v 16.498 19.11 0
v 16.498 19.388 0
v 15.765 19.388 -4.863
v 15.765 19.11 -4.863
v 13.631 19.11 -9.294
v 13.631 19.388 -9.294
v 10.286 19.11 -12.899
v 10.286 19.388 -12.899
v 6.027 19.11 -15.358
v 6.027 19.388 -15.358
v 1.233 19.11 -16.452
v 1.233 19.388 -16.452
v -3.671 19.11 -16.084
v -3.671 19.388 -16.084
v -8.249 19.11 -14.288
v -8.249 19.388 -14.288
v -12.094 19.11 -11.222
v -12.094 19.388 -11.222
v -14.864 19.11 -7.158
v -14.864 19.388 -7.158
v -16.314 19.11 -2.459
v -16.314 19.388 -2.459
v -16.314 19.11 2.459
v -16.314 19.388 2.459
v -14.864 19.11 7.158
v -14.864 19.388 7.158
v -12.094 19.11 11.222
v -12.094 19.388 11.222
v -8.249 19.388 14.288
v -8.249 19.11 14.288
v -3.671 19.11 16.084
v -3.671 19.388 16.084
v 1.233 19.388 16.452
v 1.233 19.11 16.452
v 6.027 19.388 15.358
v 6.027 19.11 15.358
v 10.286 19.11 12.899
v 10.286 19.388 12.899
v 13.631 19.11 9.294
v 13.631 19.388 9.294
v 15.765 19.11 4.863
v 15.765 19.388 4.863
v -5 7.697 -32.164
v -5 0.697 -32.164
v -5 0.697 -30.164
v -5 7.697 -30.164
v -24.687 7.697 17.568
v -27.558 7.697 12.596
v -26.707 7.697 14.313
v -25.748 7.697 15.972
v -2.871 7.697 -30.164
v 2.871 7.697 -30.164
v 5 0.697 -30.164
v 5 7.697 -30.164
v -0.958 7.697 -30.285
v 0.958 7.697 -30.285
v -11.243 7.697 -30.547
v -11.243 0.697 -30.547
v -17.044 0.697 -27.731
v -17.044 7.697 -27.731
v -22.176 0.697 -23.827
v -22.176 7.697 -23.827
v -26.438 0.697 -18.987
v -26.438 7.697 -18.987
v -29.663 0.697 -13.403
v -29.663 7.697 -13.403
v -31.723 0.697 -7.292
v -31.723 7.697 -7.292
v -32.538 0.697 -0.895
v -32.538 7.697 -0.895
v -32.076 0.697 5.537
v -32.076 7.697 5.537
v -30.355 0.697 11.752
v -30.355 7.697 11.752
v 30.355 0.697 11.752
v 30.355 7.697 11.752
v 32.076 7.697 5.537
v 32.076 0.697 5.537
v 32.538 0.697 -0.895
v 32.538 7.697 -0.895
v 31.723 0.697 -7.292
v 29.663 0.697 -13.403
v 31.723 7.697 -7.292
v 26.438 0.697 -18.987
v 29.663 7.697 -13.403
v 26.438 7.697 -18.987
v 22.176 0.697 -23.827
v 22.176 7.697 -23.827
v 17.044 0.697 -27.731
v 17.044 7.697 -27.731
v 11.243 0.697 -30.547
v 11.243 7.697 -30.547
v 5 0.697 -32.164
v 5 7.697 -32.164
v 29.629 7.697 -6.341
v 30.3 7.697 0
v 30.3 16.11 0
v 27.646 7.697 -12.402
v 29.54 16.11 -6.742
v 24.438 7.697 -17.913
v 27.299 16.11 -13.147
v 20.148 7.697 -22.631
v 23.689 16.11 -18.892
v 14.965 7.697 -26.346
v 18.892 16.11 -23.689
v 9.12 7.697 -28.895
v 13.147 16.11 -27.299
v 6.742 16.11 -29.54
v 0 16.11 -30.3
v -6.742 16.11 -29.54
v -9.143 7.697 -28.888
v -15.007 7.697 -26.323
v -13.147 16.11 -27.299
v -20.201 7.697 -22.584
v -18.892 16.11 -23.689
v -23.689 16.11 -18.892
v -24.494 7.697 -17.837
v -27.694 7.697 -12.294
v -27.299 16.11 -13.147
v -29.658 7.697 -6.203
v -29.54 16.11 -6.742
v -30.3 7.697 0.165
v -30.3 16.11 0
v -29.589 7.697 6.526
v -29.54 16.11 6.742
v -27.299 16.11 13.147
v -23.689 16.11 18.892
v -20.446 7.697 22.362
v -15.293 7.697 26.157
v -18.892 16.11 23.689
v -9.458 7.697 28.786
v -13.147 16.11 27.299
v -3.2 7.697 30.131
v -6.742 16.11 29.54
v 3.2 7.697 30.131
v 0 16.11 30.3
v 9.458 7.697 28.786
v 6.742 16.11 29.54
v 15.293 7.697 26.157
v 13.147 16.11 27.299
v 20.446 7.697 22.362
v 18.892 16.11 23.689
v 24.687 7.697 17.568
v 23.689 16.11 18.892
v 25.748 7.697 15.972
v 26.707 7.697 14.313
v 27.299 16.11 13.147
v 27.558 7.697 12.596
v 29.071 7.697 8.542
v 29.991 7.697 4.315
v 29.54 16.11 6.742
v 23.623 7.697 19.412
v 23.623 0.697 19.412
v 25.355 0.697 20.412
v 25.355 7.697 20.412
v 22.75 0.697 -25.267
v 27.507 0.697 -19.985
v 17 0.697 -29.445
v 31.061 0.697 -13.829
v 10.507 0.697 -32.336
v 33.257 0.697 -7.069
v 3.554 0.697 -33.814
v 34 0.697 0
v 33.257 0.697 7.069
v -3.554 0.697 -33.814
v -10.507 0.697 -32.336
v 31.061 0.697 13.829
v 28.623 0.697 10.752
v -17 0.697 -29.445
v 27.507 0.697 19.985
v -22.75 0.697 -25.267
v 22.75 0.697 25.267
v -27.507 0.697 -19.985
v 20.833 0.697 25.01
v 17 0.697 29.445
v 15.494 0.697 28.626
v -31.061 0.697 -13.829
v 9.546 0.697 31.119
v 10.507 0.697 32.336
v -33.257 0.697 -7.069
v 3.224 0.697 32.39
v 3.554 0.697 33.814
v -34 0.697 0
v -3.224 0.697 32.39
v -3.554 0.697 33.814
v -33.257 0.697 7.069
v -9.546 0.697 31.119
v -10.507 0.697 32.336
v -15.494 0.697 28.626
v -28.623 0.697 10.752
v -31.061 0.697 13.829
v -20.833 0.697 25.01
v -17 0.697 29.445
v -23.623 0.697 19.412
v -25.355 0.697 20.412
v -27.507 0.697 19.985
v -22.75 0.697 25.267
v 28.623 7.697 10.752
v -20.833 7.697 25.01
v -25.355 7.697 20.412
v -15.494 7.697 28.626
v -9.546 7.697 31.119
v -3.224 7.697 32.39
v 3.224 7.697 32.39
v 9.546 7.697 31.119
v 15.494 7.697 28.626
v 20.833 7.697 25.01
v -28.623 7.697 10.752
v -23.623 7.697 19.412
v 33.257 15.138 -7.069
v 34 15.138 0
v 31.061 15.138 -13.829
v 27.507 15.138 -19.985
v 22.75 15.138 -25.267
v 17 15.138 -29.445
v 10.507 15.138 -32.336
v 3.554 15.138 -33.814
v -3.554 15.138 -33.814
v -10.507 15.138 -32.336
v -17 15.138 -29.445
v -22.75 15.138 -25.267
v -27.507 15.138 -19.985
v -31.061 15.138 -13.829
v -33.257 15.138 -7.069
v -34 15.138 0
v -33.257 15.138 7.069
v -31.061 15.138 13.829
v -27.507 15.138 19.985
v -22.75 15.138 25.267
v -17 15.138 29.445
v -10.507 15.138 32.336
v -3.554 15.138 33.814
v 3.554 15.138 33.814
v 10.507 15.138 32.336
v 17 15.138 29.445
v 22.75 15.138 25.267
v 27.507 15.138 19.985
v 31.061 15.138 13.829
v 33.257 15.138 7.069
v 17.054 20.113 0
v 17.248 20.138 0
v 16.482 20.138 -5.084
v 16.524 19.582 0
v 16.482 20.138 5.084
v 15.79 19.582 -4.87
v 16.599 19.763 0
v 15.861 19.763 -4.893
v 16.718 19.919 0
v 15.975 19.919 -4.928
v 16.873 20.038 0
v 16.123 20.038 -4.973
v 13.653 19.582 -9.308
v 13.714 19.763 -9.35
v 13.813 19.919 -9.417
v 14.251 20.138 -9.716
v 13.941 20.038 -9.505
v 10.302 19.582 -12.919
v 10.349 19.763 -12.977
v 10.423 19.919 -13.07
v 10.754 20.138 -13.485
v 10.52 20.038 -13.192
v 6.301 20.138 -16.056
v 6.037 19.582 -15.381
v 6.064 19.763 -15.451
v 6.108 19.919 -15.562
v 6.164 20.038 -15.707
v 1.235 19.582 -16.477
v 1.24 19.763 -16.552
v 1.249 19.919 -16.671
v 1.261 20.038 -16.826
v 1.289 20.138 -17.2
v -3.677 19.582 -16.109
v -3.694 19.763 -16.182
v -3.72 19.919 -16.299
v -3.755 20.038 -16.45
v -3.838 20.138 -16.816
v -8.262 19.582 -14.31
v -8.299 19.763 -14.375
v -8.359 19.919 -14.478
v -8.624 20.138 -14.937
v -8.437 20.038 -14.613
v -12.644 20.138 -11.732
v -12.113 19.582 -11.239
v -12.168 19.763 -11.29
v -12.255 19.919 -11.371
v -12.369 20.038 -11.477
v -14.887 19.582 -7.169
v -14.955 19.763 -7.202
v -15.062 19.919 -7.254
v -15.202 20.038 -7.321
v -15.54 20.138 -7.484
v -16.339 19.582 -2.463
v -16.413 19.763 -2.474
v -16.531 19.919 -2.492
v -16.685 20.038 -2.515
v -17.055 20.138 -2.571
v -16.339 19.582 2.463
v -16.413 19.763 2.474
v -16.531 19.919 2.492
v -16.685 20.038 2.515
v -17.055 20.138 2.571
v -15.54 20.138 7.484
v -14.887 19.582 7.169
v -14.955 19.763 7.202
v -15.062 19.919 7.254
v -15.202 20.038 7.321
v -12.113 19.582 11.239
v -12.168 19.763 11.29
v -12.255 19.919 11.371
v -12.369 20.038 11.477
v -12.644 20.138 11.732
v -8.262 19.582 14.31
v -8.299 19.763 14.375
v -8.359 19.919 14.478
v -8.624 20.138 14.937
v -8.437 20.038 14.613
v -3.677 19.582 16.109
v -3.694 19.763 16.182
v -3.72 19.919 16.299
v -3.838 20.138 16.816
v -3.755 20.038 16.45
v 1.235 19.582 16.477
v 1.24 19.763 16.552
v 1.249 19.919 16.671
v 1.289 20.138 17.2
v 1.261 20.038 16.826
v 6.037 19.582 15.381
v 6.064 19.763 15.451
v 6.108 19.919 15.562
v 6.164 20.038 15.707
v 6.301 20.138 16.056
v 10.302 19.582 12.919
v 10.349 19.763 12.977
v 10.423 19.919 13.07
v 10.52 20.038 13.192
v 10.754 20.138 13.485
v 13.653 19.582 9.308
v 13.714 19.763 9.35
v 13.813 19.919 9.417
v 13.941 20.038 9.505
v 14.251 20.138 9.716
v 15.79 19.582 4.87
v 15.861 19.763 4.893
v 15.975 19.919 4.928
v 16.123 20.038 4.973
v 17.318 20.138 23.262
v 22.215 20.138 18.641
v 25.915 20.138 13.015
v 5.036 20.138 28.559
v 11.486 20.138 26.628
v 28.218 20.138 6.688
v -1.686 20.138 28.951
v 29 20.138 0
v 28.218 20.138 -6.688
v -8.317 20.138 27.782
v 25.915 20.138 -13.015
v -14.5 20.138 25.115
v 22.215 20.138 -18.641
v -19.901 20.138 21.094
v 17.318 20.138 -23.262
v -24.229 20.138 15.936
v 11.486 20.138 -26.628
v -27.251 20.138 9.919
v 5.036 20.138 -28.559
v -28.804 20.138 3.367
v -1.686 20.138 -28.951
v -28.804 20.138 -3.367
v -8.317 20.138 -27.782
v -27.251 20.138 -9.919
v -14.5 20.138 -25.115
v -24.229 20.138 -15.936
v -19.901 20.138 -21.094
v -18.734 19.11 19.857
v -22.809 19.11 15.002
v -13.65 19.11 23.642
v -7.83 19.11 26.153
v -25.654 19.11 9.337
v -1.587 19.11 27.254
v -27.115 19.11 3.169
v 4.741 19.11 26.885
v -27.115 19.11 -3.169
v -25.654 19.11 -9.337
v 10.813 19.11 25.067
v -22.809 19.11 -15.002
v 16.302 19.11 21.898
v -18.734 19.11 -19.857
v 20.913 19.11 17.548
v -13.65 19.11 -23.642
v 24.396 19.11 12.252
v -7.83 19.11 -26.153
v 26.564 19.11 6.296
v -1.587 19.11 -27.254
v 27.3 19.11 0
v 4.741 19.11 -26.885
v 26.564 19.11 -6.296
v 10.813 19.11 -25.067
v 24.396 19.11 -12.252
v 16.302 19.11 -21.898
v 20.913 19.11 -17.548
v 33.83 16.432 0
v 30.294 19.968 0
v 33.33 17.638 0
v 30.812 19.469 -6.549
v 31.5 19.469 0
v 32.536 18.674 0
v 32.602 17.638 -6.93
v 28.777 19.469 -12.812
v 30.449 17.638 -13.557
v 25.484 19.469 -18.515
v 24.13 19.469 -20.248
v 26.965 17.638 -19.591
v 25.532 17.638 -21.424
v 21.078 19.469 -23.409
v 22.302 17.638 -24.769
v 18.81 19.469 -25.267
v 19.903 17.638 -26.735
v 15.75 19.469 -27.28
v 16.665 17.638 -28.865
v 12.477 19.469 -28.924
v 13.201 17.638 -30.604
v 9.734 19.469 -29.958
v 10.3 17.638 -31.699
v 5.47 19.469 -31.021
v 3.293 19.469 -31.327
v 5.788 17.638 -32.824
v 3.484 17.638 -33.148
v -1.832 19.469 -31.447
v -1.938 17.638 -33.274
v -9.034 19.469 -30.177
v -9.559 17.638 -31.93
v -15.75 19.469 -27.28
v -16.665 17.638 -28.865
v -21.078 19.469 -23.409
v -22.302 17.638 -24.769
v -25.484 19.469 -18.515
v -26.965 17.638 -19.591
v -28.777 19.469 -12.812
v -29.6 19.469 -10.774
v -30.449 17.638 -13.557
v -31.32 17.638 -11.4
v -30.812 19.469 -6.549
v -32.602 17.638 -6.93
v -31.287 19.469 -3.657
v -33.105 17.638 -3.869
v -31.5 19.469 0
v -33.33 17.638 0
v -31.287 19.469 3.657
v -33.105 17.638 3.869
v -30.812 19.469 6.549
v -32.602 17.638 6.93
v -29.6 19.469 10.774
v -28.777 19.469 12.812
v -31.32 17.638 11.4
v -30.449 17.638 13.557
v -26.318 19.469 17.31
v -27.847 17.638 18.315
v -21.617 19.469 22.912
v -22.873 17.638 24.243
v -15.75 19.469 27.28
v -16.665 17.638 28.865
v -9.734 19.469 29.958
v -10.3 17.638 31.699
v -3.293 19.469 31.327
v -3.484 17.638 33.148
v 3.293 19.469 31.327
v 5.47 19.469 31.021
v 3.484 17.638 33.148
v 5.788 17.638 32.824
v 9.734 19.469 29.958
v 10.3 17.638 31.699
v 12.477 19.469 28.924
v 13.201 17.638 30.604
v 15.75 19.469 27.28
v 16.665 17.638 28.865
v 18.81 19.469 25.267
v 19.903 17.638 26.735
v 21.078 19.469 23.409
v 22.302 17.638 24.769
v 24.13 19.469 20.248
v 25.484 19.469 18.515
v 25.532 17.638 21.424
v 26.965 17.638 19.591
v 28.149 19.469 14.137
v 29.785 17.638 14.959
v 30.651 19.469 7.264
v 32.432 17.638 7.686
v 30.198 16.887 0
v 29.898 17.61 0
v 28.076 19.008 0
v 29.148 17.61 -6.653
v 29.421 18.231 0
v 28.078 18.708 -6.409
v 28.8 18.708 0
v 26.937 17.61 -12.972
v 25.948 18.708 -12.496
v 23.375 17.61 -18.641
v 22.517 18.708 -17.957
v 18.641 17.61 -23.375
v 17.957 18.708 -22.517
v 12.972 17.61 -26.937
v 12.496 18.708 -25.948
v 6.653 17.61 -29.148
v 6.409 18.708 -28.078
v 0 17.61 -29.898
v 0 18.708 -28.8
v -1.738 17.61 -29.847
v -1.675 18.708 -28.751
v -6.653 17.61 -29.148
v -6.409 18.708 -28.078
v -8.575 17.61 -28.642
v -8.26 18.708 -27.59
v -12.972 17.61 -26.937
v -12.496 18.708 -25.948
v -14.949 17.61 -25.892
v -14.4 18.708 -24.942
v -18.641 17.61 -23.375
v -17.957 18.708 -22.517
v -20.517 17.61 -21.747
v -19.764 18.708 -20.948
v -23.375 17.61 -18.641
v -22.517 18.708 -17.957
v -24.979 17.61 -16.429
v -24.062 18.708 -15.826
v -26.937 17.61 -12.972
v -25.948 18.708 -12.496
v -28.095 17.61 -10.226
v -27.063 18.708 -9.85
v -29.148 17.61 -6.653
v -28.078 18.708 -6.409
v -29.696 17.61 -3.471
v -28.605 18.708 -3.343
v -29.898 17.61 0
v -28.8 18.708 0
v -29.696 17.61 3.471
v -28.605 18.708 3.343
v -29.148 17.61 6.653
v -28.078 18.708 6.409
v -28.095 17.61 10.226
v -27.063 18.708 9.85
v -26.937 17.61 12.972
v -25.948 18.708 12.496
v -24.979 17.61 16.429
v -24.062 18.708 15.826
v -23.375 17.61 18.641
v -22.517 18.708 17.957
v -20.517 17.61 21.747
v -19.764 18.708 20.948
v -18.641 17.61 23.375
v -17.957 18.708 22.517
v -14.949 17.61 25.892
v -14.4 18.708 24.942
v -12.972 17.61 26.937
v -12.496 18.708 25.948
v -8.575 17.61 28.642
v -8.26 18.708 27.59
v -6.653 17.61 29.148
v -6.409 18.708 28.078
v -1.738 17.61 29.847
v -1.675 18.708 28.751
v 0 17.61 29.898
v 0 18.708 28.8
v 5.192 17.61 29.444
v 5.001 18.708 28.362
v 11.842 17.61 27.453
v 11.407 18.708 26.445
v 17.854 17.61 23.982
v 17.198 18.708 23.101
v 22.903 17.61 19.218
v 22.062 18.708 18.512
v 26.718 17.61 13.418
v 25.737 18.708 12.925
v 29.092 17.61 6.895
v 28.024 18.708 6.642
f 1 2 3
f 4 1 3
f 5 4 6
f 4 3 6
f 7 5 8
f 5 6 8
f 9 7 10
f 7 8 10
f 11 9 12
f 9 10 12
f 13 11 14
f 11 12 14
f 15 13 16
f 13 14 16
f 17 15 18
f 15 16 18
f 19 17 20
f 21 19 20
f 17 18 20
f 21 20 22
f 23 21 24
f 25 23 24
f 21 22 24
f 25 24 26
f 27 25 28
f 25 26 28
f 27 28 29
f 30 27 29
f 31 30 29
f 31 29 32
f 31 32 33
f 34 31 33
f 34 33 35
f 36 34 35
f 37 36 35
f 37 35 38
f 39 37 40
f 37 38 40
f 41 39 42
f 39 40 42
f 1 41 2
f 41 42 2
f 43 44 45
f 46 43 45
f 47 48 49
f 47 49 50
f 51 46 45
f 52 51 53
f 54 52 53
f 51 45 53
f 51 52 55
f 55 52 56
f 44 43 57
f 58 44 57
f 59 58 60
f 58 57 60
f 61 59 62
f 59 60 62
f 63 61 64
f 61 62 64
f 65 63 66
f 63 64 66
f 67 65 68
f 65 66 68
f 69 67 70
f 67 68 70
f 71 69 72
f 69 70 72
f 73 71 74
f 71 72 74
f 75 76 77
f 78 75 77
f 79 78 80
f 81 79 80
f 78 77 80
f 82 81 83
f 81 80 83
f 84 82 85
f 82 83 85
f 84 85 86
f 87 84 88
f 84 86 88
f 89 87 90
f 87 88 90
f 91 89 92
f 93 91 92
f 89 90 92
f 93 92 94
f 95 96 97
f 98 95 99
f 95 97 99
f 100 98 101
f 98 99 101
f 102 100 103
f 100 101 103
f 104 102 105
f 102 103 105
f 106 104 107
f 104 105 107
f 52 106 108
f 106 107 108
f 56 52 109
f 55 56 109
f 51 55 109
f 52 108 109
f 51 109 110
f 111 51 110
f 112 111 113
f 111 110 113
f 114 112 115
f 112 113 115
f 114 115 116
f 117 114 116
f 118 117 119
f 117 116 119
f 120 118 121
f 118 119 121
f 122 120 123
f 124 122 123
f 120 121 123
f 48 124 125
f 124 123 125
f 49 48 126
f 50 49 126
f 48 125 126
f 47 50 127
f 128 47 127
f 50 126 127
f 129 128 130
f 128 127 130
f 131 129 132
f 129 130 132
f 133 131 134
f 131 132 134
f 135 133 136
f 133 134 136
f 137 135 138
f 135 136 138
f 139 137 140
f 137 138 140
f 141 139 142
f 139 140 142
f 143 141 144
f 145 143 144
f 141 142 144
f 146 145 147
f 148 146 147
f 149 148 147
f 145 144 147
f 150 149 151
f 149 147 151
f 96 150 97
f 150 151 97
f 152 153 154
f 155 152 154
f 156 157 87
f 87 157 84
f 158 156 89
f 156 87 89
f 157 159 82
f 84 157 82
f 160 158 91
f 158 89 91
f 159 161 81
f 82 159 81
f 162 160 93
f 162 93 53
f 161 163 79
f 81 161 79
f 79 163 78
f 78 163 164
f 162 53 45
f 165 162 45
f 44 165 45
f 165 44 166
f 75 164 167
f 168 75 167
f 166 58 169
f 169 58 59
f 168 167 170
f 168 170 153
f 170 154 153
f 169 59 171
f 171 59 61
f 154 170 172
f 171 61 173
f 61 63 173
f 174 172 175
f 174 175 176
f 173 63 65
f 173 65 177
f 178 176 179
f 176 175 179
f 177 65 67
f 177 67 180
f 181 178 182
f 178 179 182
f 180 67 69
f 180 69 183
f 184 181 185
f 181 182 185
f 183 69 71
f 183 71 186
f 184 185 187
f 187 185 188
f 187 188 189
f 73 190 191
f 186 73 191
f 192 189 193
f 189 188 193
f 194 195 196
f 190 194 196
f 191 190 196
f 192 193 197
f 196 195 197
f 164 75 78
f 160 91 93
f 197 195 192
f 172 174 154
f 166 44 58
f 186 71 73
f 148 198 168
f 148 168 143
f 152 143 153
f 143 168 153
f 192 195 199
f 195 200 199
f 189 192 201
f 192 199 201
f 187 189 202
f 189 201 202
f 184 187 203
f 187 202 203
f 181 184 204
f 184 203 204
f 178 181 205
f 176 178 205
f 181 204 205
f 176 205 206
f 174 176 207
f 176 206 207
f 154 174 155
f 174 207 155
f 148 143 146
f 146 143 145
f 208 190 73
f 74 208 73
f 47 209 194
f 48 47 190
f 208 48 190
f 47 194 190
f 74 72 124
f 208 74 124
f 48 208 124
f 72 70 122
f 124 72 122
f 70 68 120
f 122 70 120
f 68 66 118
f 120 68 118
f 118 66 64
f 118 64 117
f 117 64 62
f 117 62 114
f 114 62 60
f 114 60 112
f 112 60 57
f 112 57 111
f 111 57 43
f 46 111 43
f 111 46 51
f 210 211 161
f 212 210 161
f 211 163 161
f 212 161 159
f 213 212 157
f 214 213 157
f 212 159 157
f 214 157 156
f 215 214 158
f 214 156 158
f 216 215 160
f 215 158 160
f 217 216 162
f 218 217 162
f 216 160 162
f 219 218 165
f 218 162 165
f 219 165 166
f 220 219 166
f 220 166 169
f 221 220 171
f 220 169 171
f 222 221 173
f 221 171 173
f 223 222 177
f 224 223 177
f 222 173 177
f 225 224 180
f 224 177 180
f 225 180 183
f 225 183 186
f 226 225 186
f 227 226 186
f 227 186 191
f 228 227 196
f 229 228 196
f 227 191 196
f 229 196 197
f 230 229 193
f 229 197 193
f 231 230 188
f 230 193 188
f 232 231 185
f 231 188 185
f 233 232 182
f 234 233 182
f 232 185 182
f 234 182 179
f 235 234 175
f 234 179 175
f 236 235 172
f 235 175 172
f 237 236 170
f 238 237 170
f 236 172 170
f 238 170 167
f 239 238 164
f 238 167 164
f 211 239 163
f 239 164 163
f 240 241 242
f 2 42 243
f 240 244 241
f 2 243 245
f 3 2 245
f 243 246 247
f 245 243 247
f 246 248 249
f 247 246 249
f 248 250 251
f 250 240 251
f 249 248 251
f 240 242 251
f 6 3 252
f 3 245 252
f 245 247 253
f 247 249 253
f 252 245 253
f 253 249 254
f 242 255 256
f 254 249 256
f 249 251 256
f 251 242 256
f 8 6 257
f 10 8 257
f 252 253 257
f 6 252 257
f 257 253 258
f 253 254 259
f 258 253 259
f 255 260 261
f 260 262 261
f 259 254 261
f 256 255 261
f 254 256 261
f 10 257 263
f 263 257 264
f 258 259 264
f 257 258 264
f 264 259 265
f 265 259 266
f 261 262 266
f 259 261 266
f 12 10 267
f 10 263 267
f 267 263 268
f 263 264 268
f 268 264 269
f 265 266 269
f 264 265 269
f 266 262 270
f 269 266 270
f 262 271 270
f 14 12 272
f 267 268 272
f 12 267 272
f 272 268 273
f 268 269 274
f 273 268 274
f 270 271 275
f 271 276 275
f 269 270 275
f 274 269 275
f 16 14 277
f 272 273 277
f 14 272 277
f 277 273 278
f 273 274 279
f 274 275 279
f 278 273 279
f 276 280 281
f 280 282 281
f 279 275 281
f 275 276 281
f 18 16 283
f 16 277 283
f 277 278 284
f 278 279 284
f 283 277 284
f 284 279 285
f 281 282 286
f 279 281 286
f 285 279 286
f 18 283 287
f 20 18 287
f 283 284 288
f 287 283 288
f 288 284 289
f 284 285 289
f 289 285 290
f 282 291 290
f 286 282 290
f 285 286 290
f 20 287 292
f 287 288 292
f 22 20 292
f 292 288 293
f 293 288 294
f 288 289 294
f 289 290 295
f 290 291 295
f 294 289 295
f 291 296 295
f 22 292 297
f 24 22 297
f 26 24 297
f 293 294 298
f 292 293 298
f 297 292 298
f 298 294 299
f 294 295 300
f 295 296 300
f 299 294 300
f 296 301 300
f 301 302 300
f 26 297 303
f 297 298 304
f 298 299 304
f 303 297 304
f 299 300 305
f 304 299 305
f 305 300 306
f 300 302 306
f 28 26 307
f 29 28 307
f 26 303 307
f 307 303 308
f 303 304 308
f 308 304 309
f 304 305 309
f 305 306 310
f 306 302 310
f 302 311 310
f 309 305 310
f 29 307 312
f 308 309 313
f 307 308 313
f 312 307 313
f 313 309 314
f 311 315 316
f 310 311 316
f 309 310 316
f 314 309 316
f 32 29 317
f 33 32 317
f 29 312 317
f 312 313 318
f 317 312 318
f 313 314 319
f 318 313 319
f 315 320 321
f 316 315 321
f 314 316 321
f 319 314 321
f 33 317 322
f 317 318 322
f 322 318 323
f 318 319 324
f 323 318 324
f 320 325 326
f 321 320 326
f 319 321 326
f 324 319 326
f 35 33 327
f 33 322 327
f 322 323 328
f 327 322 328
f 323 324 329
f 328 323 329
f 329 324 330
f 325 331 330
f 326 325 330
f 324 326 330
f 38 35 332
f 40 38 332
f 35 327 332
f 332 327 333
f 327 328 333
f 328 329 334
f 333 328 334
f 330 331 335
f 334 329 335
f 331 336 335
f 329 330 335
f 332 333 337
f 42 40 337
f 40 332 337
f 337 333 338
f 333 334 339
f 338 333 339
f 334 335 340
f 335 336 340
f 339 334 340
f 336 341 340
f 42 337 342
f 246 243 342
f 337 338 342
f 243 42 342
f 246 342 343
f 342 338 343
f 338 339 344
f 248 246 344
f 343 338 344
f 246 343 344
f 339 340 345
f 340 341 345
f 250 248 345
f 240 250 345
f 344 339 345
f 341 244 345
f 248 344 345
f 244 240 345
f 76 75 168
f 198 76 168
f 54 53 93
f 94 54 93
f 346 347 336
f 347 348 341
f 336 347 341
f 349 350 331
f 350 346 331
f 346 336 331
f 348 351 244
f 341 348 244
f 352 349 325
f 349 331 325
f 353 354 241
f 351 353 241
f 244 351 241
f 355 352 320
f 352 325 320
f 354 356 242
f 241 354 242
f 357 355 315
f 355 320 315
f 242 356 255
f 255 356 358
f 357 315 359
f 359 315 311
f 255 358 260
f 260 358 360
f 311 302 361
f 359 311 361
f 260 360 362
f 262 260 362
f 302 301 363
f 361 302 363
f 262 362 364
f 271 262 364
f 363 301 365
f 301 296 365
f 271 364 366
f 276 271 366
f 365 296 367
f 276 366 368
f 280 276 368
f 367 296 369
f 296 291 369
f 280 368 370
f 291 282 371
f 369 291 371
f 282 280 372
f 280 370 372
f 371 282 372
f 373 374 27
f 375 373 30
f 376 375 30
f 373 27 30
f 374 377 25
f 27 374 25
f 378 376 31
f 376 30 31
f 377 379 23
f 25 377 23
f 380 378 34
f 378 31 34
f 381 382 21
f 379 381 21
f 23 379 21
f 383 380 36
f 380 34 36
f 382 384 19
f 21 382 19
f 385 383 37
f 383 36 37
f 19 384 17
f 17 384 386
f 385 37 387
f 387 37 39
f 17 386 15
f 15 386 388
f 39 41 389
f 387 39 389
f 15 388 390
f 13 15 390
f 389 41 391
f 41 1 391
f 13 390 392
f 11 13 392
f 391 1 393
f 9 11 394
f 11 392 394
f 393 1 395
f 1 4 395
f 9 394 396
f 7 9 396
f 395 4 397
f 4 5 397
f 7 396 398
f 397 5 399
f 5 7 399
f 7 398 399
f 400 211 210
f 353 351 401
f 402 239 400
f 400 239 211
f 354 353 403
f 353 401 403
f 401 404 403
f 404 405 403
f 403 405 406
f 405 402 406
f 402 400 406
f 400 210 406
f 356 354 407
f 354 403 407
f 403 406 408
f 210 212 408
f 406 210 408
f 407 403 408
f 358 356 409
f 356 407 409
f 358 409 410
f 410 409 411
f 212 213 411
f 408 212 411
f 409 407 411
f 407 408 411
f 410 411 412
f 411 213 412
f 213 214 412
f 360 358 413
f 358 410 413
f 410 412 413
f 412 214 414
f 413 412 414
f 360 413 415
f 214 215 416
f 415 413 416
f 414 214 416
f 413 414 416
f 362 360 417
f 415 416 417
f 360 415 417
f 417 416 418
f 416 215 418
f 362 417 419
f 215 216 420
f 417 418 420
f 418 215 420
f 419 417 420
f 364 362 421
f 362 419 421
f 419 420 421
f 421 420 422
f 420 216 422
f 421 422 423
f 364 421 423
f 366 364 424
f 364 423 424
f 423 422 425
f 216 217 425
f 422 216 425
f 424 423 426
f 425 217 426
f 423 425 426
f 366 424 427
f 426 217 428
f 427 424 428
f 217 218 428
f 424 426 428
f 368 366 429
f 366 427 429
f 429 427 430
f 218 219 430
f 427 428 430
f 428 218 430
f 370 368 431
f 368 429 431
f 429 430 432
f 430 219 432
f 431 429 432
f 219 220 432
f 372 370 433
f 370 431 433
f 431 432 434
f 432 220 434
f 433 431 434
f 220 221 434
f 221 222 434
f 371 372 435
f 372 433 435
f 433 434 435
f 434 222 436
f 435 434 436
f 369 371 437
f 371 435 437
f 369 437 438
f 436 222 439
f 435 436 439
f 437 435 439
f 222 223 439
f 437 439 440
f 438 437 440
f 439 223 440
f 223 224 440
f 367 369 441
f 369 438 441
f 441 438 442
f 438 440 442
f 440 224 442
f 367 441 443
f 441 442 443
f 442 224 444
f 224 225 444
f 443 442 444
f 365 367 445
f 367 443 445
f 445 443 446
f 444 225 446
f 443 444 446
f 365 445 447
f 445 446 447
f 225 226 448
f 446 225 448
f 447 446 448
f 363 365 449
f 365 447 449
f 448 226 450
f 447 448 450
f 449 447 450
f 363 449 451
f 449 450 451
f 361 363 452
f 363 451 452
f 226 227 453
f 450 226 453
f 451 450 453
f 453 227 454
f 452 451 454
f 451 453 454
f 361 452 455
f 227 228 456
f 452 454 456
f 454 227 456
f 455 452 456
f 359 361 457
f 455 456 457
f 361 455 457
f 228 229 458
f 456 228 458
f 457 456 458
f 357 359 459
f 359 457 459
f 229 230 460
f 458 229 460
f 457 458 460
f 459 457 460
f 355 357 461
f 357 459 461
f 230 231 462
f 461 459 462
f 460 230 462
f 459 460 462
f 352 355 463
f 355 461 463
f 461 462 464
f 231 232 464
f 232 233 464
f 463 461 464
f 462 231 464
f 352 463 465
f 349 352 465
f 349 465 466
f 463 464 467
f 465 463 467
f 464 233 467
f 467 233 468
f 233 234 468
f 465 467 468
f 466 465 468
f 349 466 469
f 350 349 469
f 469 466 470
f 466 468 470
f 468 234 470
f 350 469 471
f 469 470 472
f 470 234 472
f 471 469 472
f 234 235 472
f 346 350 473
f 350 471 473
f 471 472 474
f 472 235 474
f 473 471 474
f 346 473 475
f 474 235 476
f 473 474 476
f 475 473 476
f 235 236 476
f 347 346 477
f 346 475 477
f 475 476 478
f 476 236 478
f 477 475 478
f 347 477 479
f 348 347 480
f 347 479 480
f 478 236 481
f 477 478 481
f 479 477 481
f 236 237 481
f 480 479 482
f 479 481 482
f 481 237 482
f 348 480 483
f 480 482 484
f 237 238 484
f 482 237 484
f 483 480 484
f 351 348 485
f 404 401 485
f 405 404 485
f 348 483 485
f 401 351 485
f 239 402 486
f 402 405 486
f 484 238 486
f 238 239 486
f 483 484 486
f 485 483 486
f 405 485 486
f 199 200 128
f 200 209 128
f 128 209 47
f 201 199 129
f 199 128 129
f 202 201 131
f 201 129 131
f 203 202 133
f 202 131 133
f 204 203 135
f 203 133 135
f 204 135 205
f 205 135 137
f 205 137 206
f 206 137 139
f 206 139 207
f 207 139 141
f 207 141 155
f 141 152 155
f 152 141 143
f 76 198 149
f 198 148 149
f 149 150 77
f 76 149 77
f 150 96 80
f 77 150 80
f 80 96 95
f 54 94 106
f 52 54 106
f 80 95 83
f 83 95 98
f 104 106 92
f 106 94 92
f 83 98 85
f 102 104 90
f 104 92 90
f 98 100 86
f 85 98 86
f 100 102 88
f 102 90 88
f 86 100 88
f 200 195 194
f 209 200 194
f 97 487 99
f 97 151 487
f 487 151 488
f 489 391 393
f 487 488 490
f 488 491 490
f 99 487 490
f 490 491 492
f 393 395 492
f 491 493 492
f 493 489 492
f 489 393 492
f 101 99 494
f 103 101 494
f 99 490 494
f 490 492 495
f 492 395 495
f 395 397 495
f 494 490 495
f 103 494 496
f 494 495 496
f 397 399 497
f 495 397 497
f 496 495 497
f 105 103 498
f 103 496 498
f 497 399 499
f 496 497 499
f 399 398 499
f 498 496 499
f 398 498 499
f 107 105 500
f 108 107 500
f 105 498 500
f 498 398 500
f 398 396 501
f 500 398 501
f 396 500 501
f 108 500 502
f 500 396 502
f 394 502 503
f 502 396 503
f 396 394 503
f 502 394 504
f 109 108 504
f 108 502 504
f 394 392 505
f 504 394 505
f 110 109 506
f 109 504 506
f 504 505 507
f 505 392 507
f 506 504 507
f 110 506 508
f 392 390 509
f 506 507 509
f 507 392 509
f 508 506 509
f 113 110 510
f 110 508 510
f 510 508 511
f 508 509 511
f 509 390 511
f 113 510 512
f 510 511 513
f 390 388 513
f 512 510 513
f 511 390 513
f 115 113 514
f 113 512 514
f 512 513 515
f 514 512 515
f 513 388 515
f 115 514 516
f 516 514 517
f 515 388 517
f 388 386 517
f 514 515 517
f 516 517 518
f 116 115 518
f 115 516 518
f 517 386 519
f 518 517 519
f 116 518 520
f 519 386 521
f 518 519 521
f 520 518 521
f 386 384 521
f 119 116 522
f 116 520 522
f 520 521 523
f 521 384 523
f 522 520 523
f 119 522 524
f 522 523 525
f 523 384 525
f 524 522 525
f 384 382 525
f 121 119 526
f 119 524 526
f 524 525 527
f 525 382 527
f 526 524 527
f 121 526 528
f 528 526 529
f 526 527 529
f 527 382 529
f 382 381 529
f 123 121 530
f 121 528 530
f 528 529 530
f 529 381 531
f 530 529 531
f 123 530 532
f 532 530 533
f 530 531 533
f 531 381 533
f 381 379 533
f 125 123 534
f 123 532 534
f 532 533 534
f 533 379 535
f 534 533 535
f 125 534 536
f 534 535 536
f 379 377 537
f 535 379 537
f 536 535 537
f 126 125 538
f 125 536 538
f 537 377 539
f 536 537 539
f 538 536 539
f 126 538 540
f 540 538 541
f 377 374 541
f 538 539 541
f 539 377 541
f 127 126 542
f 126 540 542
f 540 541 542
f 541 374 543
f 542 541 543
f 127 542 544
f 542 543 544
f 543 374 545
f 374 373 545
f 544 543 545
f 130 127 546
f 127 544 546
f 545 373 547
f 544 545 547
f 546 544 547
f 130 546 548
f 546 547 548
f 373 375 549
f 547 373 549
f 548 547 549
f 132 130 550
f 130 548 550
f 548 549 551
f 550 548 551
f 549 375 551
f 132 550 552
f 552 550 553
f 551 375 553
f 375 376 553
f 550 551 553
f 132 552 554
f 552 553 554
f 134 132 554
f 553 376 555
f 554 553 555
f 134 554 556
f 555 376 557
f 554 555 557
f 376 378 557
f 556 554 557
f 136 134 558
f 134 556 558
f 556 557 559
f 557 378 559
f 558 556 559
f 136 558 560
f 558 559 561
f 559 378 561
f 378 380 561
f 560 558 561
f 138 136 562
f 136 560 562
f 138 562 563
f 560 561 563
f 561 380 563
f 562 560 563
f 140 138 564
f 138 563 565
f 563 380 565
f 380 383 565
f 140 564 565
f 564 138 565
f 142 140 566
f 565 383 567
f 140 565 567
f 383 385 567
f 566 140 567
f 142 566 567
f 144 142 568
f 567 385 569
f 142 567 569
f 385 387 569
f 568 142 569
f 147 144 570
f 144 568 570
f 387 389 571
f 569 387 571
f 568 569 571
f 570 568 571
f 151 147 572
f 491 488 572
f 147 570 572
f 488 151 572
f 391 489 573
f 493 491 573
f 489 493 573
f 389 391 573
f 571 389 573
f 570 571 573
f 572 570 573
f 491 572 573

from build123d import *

# Parameters (mm, degrees)
FILLET2_R           = 0.75
BOSS_EXTRUDE4_DEPTH = 7


with BuildPart() as part:
    # Sketch5 → Revolve1 (revolve)
    with BuildSketch(Plane.XY):
        with BuildLine():
            Line((30.3, 7.697016625), (30.3, 16.110174346))
            ThreePointArc((30.3, 16.110174346), (29.421320344, 18.23149469), (27.3, 19.110174346))
            Line((27.3, 19.110174346), (22.498120145, 19.110174346))
            Line((22.498120145, 19.110174346), (16.498120145, 19.110174346))
            Line((16.498120145, 19.110174346), (16.498120145, 20.138377289))
            Line((16.498120145, 20.138377289), (29, 20.138377289))
            ThreePointArc((29, 20.138377289), (32.535533906, 18.673911195), (34, 15.138377289))
            Line((34, 15.138377289), (34, 0.697016625))
            Line((34, 0.697016625), (32.55, 0.697016625))
            Line((32.55, 0.697016625), (32.55, 7.697016625))
            Line((32.55, 7.697016625), (30.3, 7.697016625))
        make_face()
    revolve(axis=Axis((0, 0, 0), (0, 1, 0)))

    # Fillet2
    fillet2_edges = [part.edges().sort_by_distance(p)[0] for p in [
        (-16.498120145, 20.138377289, 0),
    ]]
    fillet(fillet2_edges, radius=FILLET2_R)

    # Sketch8 → Boss-Extrude4 (add)
    with BuildSketch(Plane.XZ.offset(-0.697016625)):
        with BuildLine():
            Line((-5, -30.163682936), (5, -30.163682936))
            Line((5, -30.163682936), (5, -32.163682936))
            ThreePointArc((5, -32.163682936), (0, -32.55), (-5, -32.163682936))
            Line((-5, -32.163682936), (-5, -30.163682936))
        make_face()
        with BuildLine():
            Line((-28.622515694, 10.751714449), (-30.354566502, 11.751714449))
            ThreePointArc((-30.354566502, 11.751714449), (-28.189126893, 16.275), (-25.354566502, 20.411968487))
            Line((-25.354566502, 20.411968487), (-23.622515694, 19.411968487))
            Line((-23.622515694, 19.411968487), (-28.622515694, 10.751714449))
        make_face()
        with BuildLine():
            Line((23.622515694, 19.411968487), (25.354566502, 20.411968487))
            ThreePointArc((25.354566502, 20.411968487), (28.189126893, 16.275), (30.354566502, 11.751714449))
            Line((30.354566502, 11.751714449), (28.622515694, 10.751714449))
            Line((28.622515694, 10.751714449), (23.622515694, 19.411968487))
        make_face()
    extrude(amount=-BOSS_EXTRUDE4_DEPTH)


solid = part.part
